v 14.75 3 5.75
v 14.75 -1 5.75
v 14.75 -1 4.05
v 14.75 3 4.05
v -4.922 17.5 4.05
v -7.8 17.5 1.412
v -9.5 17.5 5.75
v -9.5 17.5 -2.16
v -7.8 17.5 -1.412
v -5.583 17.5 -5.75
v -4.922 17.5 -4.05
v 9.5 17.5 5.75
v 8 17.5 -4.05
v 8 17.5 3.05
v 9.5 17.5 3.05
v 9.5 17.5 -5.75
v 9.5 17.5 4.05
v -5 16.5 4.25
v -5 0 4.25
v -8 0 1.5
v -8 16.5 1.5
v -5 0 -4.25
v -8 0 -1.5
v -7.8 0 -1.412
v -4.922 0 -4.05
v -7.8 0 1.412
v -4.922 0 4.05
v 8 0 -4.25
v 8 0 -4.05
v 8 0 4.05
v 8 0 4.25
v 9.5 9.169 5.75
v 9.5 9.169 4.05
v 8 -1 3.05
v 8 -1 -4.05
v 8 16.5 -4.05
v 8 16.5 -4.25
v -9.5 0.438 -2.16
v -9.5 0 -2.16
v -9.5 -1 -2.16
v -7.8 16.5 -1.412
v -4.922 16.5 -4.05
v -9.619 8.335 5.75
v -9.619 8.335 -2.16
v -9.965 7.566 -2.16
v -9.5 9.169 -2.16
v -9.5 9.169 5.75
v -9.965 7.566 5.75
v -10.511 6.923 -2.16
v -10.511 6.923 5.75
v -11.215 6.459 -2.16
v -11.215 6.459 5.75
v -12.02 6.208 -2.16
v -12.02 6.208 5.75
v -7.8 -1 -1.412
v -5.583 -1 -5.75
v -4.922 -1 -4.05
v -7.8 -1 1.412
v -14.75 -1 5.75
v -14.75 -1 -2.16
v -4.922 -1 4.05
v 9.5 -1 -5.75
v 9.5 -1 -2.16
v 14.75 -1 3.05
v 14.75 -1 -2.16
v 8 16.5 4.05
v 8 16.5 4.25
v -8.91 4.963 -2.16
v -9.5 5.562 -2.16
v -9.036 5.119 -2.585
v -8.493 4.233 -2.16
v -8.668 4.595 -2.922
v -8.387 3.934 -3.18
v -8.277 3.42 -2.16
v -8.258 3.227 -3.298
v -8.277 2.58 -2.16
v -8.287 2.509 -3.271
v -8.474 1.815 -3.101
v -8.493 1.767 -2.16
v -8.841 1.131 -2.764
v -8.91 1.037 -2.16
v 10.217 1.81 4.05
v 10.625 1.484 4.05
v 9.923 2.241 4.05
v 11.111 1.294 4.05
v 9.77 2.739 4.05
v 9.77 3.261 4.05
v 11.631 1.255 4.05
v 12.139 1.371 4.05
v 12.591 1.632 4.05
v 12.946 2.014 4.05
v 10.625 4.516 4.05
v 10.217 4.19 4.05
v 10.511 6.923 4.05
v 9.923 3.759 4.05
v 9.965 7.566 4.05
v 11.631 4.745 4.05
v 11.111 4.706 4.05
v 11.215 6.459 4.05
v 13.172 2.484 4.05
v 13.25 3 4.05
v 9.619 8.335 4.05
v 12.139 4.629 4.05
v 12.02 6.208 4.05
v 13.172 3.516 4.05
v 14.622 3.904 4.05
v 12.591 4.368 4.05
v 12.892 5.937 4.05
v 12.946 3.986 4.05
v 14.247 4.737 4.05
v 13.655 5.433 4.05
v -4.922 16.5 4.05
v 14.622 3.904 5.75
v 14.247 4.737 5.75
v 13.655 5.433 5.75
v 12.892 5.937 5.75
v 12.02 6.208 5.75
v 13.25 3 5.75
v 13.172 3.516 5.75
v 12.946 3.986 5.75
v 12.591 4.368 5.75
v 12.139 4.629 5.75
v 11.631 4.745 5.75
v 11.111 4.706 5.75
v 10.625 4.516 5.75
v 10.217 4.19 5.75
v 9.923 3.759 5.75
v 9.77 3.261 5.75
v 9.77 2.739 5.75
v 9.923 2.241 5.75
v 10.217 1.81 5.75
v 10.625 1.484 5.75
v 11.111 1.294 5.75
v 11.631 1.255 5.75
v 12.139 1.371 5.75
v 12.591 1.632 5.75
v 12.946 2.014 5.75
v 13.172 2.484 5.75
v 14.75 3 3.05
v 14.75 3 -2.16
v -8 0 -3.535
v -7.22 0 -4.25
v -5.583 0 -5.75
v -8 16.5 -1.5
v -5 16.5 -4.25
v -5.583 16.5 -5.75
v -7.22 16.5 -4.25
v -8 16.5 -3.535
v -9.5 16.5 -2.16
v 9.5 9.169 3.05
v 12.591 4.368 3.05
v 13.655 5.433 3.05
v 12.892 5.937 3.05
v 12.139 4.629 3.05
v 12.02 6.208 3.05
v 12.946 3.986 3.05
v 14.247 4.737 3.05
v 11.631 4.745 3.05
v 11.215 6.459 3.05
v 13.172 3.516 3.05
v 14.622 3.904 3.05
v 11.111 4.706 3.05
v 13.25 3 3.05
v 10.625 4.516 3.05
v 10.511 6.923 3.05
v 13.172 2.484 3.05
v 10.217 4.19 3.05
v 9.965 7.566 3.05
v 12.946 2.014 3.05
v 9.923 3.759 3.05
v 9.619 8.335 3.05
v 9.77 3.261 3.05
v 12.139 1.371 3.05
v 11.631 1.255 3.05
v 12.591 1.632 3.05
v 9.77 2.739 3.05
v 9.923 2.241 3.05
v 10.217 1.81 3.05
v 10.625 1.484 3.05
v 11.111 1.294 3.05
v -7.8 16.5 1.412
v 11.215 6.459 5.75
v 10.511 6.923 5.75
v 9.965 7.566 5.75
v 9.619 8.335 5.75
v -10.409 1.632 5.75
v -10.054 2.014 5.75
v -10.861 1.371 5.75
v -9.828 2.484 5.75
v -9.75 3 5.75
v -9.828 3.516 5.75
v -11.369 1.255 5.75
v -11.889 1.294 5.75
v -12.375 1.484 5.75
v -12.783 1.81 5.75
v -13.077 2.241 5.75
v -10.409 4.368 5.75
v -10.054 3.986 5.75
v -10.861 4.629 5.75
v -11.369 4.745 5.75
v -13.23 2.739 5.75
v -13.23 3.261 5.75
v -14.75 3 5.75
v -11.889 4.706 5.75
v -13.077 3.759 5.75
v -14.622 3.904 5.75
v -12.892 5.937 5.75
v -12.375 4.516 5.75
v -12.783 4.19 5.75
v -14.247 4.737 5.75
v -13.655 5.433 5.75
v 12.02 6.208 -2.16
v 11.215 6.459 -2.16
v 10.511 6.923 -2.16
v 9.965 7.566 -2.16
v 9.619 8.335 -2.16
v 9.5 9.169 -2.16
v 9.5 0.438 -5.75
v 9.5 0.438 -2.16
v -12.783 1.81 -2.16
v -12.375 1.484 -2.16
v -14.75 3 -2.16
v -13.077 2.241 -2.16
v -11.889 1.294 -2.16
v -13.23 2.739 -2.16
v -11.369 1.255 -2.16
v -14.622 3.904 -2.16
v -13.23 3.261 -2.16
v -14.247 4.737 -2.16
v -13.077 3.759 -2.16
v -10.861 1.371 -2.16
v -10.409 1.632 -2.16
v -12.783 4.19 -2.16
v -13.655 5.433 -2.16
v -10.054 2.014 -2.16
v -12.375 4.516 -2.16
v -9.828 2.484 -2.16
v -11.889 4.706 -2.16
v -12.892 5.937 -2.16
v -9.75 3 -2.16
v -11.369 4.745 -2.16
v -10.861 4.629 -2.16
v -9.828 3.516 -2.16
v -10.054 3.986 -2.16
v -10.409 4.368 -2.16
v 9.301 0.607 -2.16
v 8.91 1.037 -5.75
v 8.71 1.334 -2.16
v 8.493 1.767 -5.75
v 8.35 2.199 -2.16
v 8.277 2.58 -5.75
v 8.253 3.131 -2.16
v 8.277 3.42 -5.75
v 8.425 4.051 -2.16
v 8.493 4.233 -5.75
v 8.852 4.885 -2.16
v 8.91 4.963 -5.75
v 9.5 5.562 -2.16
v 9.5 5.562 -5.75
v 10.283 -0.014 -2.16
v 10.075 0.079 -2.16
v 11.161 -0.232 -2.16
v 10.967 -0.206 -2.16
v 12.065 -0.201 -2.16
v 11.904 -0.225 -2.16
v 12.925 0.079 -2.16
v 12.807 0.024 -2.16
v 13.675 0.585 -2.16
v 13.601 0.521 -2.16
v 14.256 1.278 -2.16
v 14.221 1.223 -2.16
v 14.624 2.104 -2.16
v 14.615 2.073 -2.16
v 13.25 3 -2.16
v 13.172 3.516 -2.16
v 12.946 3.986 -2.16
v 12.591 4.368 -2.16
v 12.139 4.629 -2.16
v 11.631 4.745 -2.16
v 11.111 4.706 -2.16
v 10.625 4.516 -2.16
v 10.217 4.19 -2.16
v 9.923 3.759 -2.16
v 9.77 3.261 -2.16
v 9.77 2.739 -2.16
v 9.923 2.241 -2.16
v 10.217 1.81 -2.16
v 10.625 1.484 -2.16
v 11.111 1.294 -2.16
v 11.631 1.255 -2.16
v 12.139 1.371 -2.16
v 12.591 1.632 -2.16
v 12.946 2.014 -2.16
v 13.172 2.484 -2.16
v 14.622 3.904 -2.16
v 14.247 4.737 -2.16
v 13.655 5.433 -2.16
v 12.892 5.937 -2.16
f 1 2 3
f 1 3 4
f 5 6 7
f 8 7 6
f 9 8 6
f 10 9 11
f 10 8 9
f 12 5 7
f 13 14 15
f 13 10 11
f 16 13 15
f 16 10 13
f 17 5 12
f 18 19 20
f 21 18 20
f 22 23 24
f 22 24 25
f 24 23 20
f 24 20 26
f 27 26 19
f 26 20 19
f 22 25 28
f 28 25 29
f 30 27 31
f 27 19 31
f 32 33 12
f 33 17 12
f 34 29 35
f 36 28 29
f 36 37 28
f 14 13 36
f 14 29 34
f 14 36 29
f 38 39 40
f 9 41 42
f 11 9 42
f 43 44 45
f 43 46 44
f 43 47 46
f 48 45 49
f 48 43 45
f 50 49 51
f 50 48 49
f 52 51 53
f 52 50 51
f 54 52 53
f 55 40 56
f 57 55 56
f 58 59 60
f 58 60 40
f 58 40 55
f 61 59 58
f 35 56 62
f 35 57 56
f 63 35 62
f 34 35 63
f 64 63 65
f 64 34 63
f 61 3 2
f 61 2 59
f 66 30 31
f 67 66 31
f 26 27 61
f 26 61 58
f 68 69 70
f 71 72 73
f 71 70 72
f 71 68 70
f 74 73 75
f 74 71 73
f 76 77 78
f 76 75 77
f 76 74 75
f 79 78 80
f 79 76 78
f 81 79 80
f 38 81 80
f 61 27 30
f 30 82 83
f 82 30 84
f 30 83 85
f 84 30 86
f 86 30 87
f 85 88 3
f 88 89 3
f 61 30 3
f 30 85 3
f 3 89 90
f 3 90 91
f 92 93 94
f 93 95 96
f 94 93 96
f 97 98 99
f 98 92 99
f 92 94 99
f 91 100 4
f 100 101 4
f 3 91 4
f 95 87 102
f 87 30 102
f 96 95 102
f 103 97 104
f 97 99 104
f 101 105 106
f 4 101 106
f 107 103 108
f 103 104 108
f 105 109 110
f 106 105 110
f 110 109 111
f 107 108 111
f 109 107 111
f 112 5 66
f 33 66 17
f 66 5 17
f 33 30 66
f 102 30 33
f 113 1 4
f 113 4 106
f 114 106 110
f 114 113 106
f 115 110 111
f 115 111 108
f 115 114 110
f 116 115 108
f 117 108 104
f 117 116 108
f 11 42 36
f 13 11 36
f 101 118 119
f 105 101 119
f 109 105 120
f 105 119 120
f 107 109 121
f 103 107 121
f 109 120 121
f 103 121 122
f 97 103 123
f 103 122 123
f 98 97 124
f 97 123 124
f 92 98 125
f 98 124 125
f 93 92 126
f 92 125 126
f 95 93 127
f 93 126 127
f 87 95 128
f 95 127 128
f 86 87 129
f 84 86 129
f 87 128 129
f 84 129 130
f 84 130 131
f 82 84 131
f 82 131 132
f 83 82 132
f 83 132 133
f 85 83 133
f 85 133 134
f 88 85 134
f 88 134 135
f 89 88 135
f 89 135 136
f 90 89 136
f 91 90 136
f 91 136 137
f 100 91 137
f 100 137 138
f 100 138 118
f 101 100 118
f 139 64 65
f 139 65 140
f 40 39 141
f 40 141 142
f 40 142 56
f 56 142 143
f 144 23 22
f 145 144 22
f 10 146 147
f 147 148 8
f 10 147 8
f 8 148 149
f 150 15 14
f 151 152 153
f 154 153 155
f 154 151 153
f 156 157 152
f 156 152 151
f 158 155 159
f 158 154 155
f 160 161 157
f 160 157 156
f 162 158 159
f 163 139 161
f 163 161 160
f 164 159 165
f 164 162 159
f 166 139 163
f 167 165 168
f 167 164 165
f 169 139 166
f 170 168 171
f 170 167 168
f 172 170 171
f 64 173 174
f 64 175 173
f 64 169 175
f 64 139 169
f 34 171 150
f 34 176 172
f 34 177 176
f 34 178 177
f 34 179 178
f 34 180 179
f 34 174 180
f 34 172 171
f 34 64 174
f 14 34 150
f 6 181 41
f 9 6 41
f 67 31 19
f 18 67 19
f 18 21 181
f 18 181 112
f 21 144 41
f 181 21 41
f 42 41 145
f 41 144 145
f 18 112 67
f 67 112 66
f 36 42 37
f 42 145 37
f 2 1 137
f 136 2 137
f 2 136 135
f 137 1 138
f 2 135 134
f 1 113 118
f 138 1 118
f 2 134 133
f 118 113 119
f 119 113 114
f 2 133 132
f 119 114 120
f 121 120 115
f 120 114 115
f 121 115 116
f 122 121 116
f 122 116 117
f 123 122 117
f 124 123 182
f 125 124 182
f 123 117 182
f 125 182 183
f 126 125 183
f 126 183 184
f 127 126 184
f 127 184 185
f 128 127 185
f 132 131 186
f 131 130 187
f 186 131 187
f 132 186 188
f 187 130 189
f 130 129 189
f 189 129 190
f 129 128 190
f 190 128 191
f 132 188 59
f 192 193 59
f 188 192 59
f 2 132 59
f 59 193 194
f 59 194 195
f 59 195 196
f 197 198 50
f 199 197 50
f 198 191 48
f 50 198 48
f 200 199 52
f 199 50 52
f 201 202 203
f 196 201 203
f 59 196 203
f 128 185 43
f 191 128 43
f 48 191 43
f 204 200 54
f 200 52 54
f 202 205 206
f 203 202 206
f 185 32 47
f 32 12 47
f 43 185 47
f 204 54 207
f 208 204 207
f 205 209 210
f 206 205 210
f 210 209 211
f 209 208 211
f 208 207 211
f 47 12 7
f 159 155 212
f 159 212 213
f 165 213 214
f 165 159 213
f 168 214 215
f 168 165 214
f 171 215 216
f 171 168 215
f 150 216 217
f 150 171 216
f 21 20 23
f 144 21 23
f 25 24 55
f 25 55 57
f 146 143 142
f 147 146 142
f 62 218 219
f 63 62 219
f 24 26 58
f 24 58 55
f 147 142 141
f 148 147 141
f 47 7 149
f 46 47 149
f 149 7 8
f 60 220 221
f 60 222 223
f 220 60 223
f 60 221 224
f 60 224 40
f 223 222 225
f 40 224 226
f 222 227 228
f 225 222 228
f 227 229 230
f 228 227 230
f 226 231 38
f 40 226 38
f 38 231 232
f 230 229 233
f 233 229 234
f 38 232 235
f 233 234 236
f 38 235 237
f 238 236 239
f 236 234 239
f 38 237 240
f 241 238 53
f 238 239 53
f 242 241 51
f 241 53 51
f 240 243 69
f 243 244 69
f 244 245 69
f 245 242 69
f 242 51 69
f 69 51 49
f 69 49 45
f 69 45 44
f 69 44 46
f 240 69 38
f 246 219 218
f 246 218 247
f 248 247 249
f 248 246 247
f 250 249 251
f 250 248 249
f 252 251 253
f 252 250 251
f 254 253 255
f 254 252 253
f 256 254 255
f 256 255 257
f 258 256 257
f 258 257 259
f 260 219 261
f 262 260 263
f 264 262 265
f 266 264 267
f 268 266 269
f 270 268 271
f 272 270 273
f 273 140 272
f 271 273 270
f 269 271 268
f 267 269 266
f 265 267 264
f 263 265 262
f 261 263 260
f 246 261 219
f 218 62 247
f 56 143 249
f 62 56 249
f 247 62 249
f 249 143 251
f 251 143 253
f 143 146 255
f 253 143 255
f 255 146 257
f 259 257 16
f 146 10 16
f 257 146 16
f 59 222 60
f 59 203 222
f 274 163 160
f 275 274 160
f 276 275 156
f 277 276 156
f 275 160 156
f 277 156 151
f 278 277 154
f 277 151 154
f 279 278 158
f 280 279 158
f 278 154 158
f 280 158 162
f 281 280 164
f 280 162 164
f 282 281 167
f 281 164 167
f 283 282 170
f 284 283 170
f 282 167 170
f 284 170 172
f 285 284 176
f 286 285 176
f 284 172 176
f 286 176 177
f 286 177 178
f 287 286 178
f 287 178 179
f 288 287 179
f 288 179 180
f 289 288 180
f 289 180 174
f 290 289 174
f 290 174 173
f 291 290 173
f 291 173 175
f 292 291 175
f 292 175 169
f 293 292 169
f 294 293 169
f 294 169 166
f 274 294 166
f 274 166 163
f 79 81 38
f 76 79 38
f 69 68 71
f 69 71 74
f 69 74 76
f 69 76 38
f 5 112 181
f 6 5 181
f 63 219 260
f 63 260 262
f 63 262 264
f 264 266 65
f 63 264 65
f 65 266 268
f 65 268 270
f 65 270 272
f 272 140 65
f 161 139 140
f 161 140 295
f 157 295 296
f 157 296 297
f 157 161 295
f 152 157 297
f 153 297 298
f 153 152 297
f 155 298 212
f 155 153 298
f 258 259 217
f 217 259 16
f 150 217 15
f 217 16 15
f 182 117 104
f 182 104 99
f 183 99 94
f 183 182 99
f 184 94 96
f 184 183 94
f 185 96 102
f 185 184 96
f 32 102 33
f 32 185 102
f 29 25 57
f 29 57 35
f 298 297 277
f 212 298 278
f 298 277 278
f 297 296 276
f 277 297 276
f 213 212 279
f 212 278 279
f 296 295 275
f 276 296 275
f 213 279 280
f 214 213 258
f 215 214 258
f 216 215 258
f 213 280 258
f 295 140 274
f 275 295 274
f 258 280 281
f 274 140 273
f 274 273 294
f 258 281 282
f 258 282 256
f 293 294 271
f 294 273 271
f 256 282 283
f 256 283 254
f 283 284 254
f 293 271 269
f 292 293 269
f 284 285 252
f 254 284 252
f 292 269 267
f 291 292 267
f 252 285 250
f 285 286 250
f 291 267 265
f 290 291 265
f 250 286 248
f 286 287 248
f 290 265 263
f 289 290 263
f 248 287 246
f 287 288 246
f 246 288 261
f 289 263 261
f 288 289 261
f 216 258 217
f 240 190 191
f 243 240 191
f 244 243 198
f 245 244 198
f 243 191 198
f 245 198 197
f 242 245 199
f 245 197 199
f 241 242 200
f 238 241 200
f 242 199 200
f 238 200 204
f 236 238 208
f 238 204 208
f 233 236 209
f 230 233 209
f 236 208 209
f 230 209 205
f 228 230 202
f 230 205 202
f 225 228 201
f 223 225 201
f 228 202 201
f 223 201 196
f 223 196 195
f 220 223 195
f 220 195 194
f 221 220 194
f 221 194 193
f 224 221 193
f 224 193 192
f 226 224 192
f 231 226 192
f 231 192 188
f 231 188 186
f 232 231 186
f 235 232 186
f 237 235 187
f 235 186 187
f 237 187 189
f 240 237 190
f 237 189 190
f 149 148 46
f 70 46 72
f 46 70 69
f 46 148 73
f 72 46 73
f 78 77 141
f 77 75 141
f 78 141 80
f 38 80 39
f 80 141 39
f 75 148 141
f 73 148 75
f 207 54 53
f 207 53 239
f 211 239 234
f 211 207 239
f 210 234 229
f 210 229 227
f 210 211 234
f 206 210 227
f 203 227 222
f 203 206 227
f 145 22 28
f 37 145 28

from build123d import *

# Parameters (mm, degrees)
BOSS_EXTRUDE1_DEPTH = 16.5
BOSS_EXTRUDE7_DEPTH = 1
BOSS_EXTRUDE8_DEPTH = 1
SKETCH9_R           = 1.75
BOSS_EXTRUDE9_DEPTH = 7.909853
CUT_EXTRUDE2_START  = -3.590147425
SKETCH11_R          = 3.25
CUT_EXTRUDE2_DEPTH  = 3.590147425
CUT_EXTRUDE3_START  = -18.5
SKETCH12_W          = 5.25
SKETCH12_H          = 1
SKETCH12_W_2        = 1.5
CUT_EXTRUDE3_DEPTH  = 18.5
FILLET1_R           = 3


with BuildPart() as part:
    # Sketch1 → Boss-Extrude1 (new body)
    with BuildSketch(Plane(origin=(0, 0, 0), x_dir=(1, 0, 0), z_dir=(0, 1, 0))):
        Polygon((-7.219839172, 4.25), (-5, 4.25), (8, 4.25), (8, -4.25), (-5, -4.25), (-7.219839172, -4.25), (-5.583475536, -5.75), (9.5, -5.75), (9.5, 5.75), (-5.583475536, 5.75), align=None)
        Polygon((-8, -4.25), (-8, -3.534852575), (-9.5, -2.159852575), (-9.5, -5.75), (-5.583475536, -5.75), (-7.219839172, -4.25), align=None)
        Polygon((-8, -1.5), (-8, 1.5), (-8, 3.534852575), (-9.5, 2.159852575), (-9.5, -2.159852575), (-8, -3.534852575), align=None)
        Polygon((-8, 1.5), (-5, 4.25), (-7.219839172, 4.25), (-8, 3.534852575), align=None)
        Polygon((-5, -4.25), (-8, -1.5), (-8, -3.534852575), (-7.219839172, -4.25), align=None)
        Polygon((-7.219839172, -4.25), (-8, -3.534852575), (-8, -4.25), align=None)
    extrude(amount=BOSS_EXTRUDE1_DEPTH)

    # Sketch7 → Boss-Extrude7 (add)
    # profile 1 of 2: a face of its own
    with BuildSketch(Plane(origin=(0, 16.5, 0), x_dir=(1, 0, 0), z_dir=(0, 1, 0))):
        Polygon((9.5, 5.75), (-5.583475536, 5.75), (-9.5, 2.159852575), (-9.5, -5.75), (9.5, -5.75), align=None)
        Polygon((8, -4.25), (-5, -4.25), (-8, -1.5), (-8, 1.5), (-5, 4.25), (8, 4.25), align=None, mode=Mode.SUBTRACT)
    # profile 2 of 2: a face of its own
    with BuildSketch(Plane(origin=(0, 16.5, 0), x_dir=(1, 0, 0), z_dir=(0, 1, 0))):
        Polygon((-4.922203262, 4.05), (7.8, 4.05), (8, 4.05), (8, 4.25), (-5, 4.25), (-8, 1.5), (-8, -1.5), (-5, -4.25), (8, -4.25), (8, -4.05), (7.8, -4.05), (-4.922203262, -4.05), (-7.8, -1.412019657), (-7.8, 1.412019657), align=None)
    extrude(amount=BOSS_EXTRUDE7_DEPTH)

    # Sketch8 → Boss-Extrude8 (add)
    with BuildSketch(Plane.XZ):
        Polygon((-9.5, -2.159852575), (-5.583475536, -5.75), (9.5, -5.75), (9.5, 5.75), (-9.5, 5.75), align=None)
        Polygon((8, 4.05), (-4.922203262, 4.05), (-7.8, 1.412019657), (-7.8, -1.412019657), (-4.922203262, -4.05), (8, -4.05), align=None, mode=Mode.SUBTRACT)
    extrude(amount=BOSS_EXTRUDE8_DEPTH)

    # Sketch9 → Boss-Extrude9 (add)
    # profile 1 of 4: a face of its own
    with BuildSketch(Plane.XY.offset(5.75)):
        with BuildLine():
            Line((-9.5, 0.438262309), (-9.5, 5.561737691))
            ThreePointArc((-9.5, 5.561737691), (-12.925219281, 5.920830361), (-14.75, 3))
            ThreePointArc((-14.75, 3), (-12.925219281, 0.079169639), (-9.5, 0.438262309))
        make_face()
        with Locations((-11.5, 3)):
            Circle(SKETCH9_R, mode=Mode.SUBTRACT)
    # profile 2 of 4: a face of its own
    with BuildSketch(Plane.XY.offset(5.75)):
        with BuildLine():
            ThreePointArc((14.75, 3), (12.925219281, 5.920830361), (9.5, 5.561737691))
            Line((9.5, 5.561737691), (9.5, 0.438262309))
            ThreePointArc((9.5, 0.438262309), (12.925219281, 0.079169639), (14.75, 3))
        make_face()
        with Locations((11.5, 3)):
            Circle(SKETCH9_R, mode=Mode.SUBTRACT)
    # profile 3 of 4: a face of its own
    with BuildSketch(Plane.XY.offset(5.75)):
        with BuildLine():
            Line((-9.5, -1), (-9.5, 0.438262309))
            ThreePointArc((-9.5, 0.438262309), (-12.925219281, 0.079169639), (-14.75, 3))
            Line((-14.75, 3), (-14.75, -1))
            Line((-14.75, -1), (-9.5, -1))
        make_face()
    # profile 4 of 4: a face of its own
    with BuildSketch(Plane.XY.offset(5.75)):
        with BuildLine():
            ThreePointArc((14.75, 3), (12.925219281, 0.079169639), (9.5, 0.438262309))
            Line((9.5, 0.438262309), (9.5, -1))
            Line((9.5, -1), (14.75, -1))
            Line((14.75, -1), (14.75, 3))
        make_face()
    extrude(amount=-BOSS_EXTRUDE9_DEPTH)

    # Sketch11 → Cut-Extrude2 (cut)
    with BuildSketch(Plane(origin=(0, 0, -5.75), x_dir=(-1, 0, 0), z_dir=(0, 0, -1)).offset(CUT_EXTRUDE2_START)):
        with Locations((-11.5, 3)):
            Circle(SKETCH11_R)
        with Locations((11.5, 3)):
            Circle(SKETCH11_R)
    extrude(amount=CUT_EXTRUDE2_DEPTH, mode=Mode.SUBTRACT)

    # Sketch12 → Cut-Extrude3 (cut)
    with BuildSketch(Plane(origin=(0, 17.5, 0), x_dir=(1, 0, 0), z_dir=(0, 1, 0)).offset(CUT_EXTRUDE3_START)):
        with Locations((12.125, -3.55)):
            Rectangle(SKETCH12_W, SKETCH12_H)
        with Locations((8.75, -3.55)):
            Rectangle(SKETCH12_W_2, SKETCH12_H)
    extrude(amount=CUT_EXTRUDE3_DEPTH, mode=Mode.SUBTRACT)

    # Fillet1
    # the kernel refuses this fillet: 3 mm, written as the material it adds along each edge
    with BuildSketch(Plane(origin=(-9.5, 5.561737691, 5.75), x_dir=(0, 1, 0), z_dir=(0, 0, -1))) as fillet1_piece_1_section:
        with BuildLine():
            CenterArc((3.607743648, -3), FILLET1_R, 90, 80.793103779)
            ThreePointArc((0.646392605, -2.52), (0.5863481, -1.192500248), (0, 0))
            Line((0, 0), (3.607743648, 0))
        make_face()
    fillet1_piece_1 = extrude(amount=16.929211695, mode=Mode.PRIVATE)
    fillet1_piece_1 = split(fillet1_piece_1, bisect_by=Plane(origin=(-10.050248637, 6.751557593, -2.159853), z_dir=(0, 0, 1)), keep=Keep.TOP, mode=Mode.PRIVATE)
    add(fillet1_piece_1)
    with BuildSketch(Plane(origin=(9.5, 5.561737691, 12.06935912), x_dir=(0.968641781969148, 0.24846146225045335, 0), z_dir=(0, 0, -1))) as fillet1_piece_2_section:
        with BuildLine():
            CenterArc((3.802310608, -2.749226849), FILLET1_R, 113.593384333, 80.793103779)
            Line((0.896385262, -3.494611236), (0, 0))
            ThreePointArc((0, 0), (1.300790471, -0.271670913), (2.601580942, 0))
        make_face()
    fillet1_piece_2 = extrude(amount=23.248570816, mode=Mode.PRIVATE)
    fillet1_piece_2 = split(fillet1_piece_2, bisect_by=Plane(origin=(10.078407886, 6.738604844, 5.75), z_dir=(0, 0, -1)), keep=Keep.TOP, mode=Mode.PRIVATE)
    fillet1_piece_2 = split(fillet1_piece_2, bisect_by=Plane(origin=(10.078407886, 6.738604844, 4.05), z_dir=(0, 0, 1)), keep=Keep.TOP, mode=Mode.PRIVATE)
    add(fillet1_piece_2)
    with BuildSketch(Plane(origin=(9.5, 5.561737691, 3.05), x_dir=(0.9686417819691505, 0.24846146225044377, 0), z_dir=(0, 0, -1))) as fillet1_piece_3:
        with BuildLine():
            CenterArc((3.802310608, -2.749226849), FILLET1_R, 113.593384333, 80.793103779)
            Line((0.896385262, -3.494611236), (0, 0))
            ThreePointArc((0, 0), (1.300790471, -0.271670913), (2.601580942, 0))
        make_face()
    extrude(amount=5.209852575)
    with BuildSketch(Plane(origin=(9.5, 5.561737691, 5.75), x_dir=(0.9686417819691505, 0.24846146225044377, 0), z_dir=(0, 0, -1))) as fillet1_piece_4:
        with BuildLine():
            CenterArc((3.802310608, -2.749226849), FILLET1_R, 113.593384333, 80.793103779)
            Line((0.896385262, -3.494611236), (0, 0))
            ThreePointArc((0, 0), (1.300790471, -0.271670913), (2.601580942, 0))
        make_face()
    extrude(amount=1.7)
    with BuildSketch(Plane(origin=(9.5, 5.561737691, 14.76935912), x_dir=(0.968641781969148, 0.24846146225045335, 0), z_dir=(0, 0, -1))) as fillet1_piece_5_section:
        with BuildLine():
            CenterArc((3.802310608, -2.749226849), FILLET1_R, 113.593384333, 80.793103779)
            Line((0.896385262, -3.494611236), (0, 0))
            ThreePointArc((0, 0), (1.300790471, -0.271670913), (2.601580942, 0))
        make_face()
    fillet1_piece_5 = extrude(amount=19.738718241, mode=Mode.PRIVATE)
    fillet1_piece_5 = split(fillet1_piece_5, bisect_by=Plane(origin=(10.078407886, 6.738604844, 3.05), z_dir=(0, 0, -1)), keep=Keep.TOP, mode=Mode.PRIVATE)
    fillet1_piece_5 = split(fillet1_piece_5, bisect_by=Plane(origin=(10.078407886, 6.738604844, -2.159852575), z_dir=(0, 0, 1)), keep=Keep.TOP, mode=Mode.PRIVATE)
    add(fillet1_piece_5)


solid = part.part
